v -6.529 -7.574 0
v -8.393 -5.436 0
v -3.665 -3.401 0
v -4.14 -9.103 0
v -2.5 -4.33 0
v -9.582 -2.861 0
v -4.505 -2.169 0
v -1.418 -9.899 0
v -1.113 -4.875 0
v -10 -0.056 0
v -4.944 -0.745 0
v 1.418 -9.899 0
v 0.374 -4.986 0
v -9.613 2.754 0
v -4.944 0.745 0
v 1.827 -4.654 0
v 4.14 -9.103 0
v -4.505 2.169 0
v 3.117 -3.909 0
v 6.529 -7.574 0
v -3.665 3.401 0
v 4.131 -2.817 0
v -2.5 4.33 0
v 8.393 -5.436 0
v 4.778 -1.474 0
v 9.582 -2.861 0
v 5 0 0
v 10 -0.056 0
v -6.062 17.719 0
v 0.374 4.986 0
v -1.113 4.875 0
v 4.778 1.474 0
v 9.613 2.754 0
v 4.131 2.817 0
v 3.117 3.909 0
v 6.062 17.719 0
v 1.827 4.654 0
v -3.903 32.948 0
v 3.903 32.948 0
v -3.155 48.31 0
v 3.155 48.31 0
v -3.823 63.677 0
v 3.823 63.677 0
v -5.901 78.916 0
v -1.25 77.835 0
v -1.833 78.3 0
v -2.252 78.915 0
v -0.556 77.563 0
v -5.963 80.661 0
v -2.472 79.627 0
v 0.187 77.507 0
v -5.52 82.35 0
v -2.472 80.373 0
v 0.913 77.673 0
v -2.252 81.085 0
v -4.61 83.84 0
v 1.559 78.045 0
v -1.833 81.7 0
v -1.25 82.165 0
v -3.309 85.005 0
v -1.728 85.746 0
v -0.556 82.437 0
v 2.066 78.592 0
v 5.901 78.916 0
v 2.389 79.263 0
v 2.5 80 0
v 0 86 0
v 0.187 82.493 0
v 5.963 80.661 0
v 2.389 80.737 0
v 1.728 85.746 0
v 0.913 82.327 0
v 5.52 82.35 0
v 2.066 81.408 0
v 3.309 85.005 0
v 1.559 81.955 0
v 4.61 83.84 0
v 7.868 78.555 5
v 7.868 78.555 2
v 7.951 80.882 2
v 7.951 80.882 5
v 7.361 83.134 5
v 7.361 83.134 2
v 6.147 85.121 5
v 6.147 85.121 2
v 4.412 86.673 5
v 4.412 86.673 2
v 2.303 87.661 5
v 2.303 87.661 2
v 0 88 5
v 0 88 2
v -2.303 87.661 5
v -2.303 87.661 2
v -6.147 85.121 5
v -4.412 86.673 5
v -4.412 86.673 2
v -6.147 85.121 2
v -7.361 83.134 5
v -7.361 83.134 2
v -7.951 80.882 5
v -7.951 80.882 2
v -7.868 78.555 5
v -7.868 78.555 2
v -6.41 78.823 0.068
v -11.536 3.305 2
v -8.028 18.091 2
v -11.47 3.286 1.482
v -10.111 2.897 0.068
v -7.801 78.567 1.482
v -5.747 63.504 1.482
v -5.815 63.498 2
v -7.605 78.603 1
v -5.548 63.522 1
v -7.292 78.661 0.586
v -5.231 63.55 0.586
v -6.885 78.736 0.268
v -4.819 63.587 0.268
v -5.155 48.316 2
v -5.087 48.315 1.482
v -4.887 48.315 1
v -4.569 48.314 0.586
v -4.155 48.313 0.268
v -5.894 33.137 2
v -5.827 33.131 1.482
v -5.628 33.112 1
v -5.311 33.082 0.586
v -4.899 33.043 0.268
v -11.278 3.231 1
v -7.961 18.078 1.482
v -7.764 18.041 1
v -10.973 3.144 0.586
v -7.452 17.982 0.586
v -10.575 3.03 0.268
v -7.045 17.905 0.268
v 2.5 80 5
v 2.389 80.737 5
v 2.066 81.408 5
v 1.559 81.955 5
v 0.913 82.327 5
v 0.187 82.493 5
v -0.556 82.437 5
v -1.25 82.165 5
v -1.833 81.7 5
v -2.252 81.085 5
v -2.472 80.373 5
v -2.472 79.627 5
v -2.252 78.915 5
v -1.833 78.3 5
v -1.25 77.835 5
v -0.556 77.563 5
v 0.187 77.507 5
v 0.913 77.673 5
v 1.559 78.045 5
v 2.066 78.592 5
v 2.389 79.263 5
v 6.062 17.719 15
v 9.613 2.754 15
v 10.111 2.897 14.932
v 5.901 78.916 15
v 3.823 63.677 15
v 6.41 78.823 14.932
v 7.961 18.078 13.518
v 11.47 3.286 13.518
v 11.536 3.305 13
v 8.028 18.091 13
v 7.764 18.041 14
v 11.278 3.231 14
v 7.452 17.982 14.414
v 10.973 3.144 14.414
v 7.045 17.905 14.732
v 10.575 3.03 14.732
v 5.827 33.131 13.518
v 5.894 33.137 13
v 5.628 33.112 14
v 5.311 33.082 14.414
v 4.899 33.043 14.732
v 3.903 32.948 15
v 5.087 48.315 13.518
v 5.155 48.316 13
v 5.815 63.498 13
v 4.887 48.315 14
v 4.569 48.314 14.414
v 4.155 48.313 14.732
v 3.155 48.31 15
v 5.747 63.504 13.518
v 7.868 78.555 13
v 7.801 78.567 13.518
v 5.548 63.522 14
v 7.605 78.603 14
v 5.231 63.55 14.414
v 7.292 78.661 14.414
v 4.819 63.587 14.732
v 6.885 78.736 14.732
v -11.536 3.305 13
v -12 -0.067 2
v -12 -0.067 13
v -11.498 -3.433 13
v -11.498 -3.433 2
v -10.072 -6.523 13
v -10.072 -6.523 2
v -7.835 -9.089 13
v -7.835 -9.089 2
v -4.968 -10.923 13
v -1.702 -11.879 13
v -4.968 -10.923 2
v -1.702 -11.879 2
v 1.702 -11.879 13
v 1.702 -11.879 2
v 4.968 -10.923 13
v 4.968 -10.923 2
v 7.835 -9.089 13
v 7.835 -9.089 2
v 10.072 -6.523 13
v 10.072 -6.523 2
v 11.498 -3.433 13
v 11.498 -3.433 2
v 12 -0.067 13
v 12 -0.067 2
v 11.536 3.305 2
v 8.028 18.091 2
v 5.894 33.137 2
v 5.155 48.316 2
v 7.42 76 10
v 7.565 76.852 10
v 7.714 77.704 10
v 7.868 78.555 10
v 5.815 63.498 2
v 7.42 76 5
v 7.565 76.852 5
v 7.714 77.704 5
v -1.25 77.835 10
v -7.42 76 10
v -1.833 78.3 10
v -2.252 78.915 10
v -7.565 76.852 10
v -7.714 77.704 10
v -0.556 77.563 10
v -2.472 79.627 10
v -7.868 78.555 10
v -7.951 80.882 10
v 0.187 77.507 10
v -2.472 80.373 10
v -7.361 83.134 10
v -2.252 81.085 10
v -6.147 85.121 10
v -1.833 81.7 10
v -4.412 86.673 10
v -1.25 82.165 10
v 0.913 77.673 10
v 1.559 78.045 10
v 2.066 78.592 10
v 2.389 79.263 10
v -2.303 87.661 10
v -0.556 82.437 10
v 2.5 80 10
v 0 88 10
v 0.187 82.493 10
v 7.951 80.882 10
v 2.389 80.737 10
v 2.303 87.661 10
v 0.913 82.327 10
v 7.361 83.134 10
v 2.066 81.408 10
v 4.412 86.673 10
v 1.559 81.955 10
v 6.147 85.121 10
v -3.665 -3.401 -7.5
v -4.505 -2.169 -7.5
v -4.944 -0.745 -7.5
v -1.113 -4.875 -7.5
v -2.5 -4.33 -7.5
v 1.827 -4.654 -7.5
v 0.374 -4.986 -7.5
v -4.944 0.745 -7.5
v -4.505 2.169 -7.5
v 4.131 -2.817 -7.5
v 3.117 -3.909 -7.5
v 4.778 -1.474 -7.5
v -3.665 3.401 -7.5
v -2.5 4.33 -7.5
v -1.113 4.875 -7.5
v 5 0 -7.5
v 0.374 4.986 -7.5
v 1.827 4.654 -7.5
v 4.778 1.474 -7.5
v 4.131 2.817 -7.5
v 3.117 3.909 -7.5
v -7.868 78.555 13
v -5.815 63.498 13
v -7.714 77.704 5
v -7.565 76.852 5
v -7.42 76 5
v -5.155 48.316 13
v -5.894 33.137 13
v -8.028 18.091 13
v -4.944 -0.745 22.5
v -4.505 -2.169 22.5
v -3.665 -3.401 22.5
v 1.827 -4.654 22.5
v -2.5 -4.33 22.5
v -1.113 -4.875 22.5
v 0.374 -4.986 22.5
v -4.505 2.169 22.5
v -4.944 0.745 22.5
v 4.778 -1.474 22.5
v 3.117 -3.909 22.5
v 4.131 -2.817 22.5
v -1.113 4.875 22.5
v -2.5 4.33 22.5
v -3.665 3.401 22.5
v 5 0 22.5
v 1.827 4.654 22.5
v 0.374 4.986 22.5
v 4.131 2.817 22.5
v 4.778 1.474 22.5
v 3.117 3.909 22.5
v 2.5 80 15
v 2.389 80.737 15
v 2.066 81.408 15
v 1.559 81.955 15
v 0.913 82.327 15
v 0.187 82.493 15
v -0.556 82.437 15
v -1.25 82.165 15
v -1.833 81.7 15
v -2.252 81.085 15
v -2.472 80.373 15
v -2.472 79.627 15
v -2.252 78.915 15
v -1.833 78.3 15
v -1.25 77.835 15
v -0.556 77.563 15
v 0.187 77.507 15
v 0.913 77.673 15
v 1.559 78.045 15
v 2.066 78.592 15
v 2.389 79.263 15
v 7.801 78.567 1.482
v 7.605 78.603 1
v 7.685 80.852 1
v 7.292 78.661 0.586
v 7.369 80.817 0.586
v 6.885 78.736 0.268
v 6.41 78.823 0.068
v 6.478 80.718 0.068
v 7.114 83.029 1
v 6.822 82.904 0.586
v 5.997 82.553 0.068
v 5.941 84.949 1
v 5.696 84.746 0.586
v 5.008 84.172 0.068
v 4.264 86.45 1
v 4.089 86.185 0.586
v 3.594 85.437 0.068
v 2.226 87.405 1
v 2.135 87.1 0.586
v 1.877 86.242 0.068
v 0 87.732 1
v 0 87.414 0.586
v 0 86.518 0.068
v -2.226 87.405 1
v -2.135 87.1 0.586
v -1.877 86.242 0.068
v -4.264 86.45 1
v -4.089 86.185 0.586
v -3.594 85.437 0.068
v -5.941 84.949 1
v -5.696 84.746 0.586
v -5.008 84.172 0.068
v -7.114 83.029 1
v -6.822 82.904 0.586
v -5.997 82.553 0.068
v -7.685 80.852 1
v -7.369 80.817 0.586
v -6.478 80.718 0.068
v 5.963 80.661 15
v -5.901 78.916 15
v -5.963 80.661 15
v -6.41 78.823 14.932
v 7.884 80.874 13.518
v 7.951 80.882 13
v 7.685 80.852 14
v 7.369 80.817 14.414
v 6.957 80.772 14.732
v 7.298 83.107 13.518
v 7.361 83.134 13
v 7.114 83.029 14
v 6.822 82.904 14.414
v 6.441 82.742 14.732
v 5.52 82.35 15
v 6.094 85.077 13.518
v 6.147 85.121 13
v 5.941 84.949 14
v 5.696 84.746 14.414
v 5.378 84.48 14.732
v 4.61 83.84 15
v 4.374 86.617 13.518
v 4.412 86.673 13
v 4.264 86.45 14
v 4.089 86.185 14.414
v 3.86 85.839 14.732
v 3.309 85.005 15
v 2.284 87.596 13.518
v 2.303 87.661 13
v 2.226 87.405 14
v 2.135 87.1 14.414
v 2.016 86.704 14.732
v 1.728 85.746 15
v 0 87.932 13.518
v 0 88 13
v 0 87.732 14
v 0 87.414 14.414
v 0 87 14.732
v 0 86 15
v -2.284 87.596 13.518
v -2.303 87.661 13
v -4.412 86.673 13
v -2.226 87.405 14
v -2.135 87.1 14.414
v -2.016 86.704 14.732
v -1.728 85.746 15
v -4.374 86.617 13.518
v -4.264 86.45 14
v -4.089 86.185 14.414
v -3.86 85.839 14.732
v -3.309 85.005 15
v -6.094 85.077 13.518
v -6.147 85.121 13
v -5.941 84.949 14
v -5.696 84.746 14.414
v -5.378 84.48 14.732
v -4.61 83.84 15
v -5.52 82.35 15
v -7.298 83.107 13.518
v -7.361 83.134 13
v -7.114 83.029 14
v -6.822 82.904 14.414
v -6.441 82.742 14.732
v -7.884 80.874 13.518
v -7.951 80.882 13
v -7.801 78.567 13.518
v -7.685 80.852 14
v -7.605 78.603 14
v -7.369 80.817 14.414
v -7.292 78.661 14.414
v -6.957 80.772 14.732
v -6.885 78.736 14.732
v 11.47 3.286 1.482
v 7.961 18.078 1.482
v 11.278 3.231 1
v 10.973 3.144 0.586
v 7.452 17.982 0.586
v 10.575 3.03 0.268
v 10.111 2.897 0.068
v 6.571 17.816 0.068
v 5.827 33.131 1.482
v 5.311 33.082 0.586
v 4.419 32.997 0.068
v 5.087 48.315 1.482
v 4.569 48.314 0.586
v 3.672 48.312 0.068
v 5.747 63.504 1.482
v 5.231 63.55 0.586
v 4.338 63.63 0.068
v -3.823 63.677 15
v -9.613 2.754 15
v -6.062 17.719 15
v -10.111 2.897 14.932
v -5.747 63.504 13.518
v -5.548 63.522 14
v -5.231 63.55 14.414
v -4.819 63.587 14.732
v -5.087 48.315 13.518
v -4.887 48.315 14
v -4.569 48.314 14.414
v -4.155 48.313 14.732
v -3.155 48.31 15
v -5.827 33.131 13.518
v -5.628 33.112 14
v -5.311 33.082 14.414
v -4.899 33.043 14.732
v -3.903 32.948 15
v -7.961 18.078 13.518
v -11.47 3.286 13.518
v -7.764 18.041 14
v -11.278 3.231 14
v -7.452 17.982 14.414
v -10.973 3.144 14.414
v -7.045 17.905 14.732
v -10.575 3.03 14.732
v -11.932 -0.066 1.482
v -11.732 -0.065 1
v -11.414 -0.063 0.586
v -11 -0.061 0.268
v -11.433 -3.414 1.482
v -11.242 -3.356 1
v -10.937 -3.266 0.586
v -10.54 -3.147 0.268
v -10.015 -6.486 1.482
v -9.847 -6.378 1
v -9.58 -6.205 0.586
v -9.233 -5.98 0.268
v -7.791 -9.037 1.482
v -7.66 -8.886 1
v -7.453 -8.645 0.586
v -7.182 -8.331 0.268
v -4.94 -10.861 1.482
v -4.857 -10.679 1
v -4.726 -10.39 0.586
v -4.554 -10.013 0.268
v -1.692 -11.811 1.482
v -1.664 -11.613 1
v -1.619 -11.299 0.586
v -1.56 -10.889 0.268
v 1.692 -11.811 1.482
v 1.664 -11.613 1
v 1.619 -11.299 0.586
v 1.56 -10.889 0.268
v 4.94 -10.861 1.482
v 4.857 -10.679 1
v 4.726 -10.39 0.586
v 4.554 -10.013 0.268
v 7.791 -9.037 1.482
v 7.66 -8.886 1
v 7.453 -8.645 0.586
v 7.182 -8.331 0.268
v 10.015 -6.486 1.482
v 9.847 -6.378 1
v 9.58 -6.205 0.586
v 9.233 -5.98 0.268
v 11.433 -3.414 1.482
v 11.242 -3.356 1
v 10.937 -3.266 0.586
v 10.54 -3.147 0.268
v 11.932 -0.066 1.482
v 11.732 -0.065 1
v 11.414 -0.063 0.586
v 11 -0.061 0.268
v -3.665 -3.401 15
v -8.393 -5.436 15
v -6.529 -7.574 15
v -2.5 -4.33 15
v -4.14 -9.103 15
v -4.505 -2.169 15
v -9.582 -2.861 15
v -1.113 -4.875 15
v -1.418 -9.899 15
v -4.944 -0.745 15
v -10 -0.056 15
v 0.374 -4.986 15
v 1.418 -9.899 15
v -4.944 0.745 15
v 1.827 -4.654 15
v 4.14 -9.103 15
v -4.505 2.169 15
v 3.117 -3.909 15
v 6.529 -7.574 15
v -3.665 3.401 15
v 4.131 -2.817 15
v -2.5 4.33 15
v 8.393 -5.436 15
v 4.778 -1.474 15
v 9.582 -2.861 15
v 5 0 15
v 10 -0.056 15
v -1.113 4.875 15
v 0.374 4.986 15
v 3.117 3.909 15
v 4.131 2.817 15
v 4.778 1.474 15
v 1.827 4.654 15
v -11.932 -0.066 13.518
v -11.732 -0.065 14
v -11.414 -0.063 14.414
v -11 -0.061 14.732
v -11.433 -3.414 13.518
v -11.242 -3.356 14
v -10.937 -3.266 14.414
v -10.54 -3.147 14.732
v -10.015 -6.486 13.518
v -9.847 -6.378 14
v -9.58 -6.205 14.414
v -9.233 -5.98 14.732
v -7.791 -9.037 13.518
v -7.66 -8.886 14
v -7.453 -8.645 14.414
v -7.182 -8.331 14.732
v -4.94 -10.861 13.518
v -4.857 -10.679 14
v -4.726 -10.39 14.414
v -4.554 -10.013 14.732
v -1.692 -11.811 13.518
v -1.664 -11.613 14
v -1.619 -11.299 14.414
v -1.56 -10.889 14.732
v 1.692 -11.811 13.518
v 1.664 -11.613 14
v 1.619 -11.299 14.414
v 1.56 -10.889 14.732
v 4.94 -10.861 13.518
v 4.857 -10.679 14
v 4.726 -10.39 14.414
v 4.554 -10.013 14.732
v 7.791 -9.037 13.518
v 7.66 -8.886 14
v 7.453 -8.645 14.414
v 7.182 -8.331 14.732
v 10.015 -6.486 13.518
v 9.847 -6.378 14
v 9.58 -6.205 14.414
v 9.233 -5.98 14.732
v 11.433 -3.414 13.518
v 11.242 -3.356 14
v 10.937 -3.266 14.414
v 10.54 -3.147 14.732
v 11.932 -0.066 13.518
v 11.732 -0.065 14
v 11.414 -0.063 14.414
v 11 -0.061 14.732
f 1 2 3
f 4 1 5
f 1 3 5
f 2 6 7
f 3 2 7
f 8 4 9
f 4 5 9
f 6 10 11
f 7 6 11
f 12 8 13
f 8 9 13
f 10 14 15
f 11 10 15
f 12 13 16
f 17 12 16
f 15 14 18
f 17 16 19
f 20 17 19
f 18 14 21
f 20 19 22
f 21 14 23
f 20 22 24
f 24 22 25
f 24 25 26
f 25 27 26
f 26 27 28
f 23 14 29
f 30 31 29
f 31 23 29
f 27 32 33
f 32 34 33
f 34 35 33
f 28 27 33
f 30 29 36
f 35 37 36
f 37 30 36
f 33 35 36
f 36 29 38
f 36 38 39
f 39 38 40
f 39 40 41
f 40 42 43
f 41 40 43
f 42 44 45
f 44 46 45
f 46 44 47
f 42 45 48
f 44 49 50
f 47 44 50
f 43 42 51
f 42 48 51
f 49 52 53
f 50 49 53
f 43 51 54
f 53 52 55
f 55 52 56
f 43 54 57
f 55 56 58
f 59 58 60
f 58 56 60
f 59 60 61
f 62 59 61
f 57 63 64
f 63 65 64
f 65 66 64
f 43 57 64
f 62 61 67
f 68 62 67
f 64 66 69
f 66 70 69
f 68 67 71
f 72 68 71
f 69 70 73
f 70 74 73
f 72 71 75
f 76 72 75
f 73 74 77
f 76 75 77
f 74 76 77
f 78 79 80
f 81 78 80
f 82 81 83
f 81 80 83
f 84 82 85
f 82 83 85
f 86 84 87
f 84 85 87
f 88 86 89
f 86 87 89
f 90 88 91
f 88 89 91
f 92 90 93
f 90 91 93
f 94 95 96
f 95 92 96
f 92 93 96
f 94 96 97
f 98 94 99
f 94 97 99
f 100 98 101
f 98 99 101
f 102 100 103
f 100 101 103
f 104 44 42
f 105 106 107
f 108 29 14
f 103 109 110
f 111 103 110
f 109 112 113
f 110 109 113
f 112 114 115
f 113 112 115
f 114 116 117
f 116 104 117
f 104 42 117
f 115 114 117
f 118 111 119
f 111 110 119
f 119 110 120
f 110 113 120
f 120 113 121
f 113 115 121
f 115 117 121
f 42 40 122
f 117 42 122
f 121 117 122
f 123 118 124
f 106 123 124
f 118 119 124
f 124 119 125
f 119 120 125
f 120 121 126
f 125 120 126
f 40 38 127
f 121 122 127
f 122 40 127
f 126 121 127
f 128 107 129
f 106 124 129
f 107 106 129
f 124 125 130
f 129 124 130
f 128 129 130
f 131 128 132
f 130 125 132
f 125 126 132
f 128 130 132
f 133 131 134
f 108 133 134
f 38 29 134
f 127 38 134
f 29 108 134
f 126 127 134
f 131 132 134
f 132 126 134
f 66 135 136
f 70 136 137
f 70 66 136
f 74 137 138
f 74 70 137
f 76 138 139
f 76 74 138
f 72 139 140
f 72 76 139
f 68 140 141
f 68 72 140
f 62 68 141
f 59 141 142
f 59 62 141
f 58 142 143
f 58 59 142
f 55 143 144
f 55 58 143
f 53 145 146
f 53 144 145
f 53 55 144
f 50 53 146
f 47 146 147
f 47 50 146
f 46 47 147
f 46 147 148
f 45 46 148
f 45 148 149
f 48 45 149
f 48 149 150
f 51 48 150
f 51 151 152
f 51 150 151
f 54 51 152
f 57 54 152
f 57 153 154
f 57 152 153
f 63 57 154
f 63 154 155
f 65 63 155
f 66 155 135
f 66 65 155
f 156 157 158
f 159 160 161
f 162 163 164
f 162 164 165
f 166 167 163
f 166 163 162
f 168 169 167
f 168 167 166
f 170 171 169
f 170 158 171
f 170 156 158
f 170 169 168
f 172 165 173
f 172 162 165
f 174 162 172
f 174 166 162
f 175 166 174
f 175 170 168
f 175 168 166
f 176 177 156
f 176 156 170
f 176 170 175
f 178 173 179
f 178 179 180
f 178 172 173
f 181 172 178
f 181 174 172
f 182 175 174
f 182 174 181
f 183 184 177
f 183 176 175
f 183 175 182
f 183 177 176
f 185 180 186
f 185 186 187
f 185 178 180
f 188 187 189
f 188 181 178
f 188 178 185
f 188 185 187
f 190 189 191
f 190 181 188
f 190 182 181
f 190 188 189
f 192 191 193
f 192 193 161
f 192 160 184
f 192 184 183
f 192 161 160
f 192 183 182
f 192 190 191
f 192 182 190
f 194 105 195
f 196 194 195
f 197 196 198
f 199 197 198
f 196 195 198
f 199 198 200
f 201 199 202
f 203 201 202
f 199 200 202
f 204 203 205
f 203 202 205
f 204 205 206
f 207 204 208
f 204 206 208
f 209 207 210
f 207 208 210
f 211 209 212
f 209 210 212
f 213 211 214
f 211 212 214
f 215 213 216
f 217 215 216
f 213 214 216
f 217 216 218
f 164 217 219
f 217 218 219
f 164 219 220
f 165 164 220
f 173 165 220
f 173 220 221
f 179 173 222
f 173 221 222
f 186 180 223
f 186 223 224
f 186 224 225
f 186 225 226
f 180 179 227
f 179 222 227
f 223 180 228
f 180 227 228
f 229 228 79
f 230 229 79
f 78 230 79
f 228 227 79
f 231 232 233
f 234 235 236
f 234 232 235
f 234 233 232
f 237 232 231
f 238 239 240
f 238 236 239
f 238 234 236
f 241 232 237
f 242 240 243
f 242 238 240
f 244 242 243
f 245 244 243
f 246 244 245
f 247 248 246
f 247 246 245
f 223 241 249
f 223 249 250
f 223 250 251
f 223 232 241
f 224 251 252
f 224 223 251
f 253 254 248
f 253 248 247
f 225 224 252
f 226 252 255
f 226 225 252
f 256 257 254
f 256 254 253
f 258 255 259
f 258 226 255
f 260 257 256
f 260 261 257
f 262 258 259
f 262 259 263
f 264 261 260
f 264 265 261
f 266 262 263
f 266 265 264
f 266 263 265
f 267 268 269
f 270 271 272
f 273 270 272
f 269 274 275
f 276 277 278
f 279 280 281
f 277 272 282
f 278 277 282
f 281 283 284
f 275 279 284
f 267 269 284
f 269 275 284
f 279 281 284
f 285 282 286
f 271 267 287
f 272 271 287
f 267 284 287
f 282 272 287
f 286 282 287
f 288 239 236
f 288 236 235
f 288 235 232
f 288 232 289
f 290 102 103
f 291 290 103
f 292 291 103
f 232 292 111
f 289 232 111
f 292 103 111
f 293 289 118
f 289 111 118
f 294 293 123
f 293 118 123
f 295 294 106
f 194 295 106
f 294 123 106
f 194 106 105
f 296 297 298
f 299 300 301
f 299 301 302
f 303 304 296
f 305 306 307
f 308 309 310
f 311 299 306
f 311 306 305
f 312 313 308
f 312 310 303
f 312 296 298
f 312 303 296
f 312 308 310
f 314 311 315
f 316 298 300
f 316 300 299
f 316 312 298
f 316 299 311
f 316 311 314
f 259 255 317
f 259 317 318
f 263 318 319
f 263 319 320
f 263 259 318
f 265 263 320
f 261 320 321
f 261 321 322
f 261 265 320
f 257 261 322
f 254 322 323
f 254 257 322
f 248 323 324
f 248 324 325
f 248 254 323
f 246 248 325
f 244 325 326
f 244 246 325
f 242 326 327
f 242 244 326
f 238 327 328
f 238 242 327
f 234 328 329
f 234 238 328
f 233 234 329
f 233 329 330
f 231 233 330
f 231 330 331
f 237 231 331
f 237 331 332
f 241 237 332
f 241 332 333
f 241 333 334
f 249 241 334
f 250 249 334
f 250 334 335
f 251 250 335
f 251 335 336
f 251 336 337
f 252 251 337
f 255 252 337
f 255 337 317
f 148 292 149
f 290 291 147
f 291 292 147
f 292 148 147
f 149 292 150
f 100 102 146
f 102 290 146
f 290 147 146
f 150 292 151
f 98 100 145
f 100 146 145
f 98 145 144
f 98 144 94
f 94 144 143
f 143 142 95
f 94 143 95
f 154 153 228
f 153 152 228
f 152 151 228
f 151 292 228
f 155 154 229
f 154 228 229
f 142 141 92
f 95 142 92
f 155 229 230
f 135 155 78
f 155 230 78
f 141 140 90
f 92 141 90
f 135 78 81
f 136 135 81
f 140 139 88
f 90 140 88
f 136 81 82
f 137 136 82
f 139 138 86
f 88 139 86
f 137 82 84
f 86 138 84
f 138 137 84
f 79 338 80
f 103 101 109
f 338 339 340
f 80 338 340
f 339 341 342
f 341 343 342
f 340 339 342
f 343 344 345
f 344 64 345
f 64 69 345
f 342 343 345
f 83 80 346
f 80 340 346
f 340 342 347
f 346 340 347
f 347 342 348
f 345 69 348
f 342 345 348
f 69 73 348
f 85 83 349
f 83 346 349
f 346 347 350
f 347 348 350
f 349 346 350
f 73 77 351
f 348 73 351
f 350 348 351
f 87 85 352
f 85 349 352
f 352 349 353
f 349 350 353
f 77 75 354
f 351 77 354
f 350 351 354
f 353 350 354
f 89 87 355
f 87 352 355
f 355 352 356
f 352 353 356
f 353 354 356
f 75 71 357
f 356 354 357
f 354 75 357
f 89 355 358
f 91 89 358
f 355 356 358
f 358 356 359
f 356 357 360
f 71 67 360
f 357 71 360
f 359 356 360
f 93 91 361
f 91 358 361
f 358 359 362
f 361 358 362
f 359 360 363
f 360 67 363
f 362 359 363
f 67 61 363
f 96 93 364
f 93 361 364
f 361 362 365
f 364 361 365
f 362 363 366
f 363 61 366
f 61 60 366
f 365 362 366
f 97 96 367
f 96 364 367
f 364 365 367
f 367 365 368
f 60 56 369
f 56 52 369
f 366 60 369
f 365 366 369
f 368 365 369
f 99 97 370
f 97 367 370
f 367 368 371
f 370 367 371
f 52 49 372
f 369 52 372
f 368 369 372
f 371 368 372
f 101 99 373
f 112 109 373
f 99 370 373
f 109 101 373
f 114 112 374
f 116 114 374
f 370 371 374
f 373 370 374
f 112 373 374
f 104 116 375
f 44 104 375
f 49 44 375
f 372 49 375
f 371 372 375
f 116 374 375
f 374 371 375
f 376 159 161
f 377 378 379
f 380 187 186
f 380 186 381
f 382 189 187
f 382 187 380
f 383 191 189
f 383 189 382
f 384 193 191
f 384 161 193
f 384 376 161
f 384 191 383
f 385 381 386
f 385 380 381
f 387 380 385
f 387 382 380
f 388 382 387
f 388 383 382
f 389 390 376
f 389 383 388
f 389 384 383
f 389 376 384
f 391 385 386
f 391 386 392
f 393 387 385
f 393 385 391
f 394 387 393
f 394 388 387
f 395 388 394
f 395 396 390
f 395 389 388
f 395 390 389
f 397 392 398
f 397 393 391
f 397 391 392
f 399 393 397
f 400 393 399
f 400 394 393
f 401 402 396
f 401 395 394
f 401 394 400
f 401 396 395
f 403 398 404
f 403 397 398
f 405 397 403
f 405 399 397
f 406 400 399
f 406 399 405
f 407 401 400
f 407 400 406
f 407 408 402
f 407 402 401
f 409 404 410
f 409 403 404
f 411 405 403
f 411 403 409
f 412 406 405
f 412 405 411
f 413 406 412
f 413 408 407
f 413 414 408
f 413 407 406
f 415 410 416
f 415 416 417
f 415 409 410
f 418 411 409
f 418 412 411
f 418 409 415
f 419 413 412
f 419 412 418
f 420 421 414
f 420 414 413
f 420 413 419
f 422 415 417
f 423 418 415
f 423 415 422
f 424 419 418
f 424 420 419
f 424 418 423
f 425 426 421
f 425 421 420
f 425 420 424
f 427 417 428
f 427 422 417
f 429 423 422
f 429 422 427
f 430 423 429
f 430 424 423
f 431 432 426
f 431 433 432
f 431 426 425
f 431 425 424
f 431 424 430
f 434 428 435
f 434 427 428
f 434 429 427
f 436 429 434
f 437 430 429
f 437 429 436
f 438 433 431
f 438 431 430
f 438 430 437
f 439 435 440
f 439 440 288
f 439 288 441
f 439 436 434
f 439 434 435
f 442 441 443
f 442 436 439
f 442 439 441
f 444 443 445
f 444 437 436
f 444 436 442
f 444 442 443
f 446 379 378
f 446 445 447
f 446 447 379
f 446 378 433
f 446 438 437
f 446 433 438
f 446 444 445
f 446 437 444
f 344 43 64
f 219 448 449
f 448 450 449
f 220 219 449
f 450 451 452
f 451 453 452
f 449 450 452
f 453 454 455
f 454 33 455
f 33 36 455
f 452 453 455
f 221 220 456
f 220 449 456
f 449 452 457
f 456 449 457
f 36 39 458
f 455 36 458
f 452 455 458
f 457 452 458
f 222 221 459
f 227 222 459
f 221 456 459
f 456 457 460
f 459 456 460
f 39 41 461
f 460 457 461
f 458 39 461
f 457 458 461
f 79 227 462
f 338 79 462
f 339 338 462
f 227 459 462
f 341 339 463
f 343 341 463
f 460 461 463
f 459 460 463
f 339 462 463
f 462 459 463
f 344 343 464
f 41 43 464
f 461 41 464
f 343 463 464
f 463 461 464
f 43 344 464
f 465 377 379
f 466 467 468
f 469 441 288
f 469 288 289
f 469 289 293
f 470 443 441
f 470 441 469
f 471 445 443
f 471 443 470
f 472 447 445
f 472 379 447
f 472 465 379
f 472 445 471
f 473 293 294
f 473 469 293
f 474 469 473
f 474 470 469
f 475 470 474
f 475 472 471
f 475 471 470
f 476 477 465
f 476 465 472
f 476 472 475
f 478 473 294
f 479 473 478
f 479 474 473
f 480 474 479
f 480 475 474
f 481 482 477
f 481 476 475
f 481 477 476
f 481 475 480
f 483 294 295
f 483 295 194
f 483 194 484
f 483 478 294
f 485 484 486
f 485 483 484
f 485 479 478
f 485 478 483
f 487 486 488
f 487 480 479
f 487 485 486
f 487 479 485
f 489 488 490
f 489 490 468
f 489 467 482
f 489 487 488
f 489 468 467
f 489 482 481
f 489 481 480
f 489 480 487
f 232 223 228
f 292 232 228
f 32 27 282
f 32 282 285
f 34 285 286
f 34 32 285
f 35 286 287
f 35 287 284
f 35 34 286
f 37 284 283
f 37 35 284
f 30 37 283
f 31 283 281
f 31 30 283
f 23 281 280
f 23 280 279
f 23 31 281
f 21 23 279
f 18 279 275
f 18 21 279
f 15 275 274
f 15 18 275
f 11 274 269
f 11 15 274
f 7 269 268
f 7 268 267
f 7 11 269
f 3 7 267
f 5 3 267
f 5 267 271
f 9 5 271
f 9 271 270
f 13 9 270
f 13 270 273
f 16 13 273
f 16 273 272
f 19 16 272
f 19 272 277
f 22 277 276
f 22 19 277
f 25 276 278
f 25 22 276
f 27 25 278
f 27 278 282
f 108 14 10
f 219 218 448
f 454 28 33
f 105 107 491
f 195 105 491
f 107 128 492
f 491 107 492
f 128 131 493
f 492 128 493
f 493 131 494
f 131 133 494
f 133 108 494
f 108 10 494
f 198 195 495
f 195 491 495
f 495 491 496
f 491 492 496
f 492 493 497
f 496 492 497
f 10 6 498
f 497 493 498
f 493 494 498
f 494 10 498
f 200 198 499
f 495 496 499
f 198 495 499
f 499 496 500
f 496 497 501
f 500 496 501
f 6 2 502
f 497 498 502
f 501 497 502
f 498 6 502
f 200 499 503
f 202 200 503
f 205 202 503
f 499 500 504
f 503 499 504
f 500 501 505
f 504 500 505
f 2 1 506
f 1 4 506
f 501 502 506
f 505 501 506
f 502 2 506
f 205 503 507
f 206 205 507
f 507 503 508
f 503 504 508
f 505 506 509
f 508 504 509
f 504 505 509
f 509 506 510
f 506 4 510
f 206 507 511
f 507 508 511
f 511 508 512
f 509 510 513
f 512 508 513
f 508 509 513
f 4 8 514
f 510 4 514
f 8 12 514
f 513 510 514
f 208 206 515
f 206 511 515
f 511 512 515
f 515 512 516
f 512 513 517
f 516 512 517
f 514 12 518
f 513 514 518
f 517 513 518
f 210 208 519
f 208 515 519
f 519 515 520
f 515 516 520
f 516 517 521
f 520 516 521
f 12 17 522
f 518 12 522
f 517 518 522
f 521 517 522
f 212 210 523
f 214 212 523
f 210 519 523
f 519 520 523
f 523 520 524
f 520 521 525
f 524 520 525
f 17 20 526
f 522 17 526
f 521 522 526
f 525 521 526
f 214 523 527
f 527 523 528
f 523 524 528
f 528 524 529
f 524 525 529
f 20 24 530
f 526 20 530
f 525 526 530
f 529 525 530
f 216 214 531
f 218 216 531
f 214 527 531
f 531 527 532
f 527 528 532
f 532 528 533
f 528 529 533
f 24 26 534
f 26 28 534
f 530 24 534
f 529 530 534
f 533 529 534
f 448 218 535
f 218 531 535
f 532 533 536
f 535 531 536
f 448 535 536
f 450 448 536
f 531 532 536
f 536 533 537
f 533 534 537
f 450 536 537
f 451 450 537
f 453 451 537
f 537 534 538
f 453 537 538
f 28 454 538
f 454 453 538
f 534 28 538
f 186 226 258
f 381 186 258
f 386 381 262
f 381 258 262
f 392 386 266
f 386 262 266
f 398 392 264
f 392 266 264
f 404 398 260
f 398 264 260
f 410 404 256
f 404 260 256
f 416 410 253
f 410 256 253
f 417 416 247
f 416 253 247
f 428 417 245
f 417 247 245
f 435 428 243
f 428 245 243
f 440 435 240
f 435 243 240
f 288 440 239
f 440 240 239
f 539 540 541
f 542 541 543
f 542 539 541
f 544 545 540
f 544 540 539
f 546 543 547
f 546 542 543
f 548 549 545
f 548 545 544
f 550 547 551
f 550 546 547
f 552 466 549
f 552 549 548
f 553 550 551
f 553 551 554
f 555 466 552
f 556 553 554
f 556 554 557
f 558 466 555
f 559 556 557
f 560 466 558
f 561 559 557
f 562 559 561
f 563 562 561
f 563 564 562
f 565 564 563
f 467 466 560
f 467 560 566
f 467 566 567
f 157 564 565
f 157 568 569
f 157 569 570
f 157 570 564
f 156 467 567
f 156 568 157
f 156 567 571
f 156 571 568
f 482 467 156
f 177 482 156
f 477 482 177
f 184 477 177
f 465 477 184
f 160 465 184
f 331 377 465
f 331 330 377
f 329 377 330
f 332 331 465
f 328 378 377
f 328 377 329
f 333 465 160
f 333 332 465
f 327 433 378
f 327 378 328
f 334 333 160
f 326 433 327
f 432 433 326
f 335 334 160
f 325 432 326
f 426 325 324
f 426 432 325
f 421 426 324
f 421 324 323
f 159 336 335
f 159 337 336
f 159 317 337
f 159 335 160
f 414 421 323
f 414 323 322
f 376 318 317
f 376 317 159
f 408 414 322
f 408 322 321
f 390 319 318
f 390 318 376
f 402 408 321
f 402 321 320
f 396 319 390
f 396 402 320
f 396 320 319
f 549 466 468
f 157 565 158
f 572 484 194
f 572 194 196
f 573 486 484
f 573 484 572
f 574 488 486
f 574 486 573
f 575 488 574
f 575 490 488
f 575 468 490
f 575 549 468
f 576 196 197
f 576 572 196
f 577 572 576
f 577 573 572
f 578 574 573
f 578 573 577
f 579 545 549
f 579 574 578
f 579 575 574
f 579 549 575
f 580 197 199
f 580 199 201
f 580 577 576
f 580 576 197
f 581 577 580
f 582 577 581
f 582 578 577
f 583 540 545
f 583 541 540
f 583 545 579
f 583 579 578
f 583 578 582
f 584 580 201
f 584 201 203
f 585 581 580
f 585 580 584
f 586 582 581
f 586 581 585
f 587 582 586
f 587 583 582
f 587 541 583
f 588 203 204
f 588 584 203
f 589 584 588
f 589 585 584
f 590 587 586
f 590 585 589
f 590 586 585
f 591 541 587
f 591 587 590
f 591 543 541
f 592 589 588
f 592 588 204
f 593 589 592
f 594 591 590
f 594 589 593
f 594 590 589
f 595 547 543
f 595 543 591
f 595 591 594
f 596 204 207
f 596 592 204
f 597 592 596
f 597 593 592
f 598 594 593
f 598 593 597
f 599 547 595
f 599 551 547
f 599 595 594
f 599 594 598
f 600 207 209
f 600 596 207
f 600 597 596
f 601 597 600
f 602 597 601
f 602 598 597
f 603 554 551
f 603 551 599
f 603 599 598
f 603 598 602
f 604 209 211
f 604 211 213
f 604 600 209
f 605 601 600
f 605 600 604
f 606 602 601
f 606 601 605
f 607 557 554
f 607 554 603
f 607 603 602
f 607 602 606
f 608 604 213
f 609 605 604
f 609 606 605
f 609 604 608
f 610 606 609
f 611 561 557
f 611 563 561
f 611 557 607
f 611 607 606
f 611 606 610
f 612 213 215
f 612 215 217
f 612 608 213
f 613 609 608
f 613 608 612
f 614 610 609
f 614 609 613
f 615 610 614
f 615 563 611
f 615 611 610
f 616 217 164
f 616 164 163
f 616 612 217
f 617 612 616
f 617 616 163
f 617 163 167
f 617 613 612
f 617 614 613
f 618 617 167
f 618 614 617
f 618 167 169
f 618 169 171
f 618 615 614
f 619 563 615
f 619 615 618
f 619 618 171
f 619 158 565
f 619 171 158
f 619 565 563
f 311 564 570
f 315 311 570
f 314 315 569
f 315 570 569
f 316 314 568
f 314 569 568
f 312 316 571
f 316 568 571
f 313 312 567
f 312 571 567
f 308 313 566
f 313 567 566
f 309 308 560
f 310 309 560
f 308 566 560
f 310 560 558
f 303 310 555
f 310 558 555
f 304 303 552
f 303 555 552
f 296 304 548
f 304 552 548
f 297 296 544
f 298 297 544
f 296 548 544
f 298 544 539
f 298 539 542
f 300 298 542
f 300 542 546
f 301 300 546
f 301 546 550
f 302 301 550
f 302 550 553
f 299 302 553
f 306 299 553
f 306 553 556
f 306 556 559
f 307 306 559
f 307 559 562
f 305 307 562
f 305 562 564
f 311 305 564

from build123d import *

# Parameters (mm, degrees)
SKETCH1_R                = 2.5
BOSS_EXTRUDE1_DEPTH      = 15
FILLET4_R                = 2
SKETCH9_W                = 5
SKETCH9_H                = 12
CUT_EXTRUDE1_DEPTH       = 13.0000001
CUT_EXTRUDE1_DEPTH_BACK  = 13.0000001
SKETCH10_R               = 5
BOSS_EXTRUDE2_DEPTH      = 22.5
BOSS_EXTRUDE2_DEPTH_BACK = 7.5


with BuildPart() as part:
    # Sketch1 → Boss-Extrude1 (new body)
    with BuildSketch(Plane.XY):
        with BuildLine():
            ThreePointArc((7.868400372, 78.554913295), (0, 88), (-7.868400372, 78.554913295))
            ThreePointArc((-7.868400372, 78.554913295), (-5.349774026, 40.71787649), (-11.535875122, 3.305084746))
            ThreePointArc((-11.535875122, 3.305084746), (0, -12), (11.535875122, 3.305084746))
            ThreePointArc((11.535875122, 3.305084746), (5.349774026, 40.71787649), (7.868400372, 78.554913295))
        make_face()
        with Locations((0, 80)):
            Circle(SKETCH1_R, mode=Mode.SUBTRACT)
    extrude(amount=BOSS_EXTRUDE1_DEPTH)

    # Fillet4
    fillet4_edges = [part.edges().sort_by_distance(p)[0] for p in [
        (5.349774026, 40.71787649, 15),
        (0, 88, 15),
        (-5.349774026, 40.71787649, 15),
        (0, 88, 0),
        (5.349774026, 40.71787649, 0),
        (0, -12, 0),
        (-5.349774026, 40.71787649, 0),
        (0, -12, 15),
    ]]
    fillet(fillet4_edges, radius=FILLET4_R)

    # Sketch9 → Cut-Extrude1 (cut, two sides)
    with BuildSketch(Plane(origin=(0, 0, 0), x_dir=(0, 0, -1), z_dir=(1, 0, 0))) as cut_extrude1_sk:
        with Locations((-7.5, 82.000003295)):
            Rectangle(SKETCH9_W, SKETCH9_H)
    extrude(amount=CUT_EXTRUDE1_DEPTH, mode=Mode.SUBTRACT)
    extrude(cut_extrude1_sk.sketch, amount=-CUT_EXTRUDE1_DEPTH_BACK, mode=Mode.SUBTRACT)

    # Sketch10 → Boss-Extrude2 (add, two sides)
    with BuildSketch(Plane.XY) as boss_extrude2_sk:
        Circle(SKETCH10_R)
    extrude(amount=BOSS_EXTRUDE2_DEPTH)
    extrude(boss_extrude2_sk.sketch, amount=-BOSS_EXTRUDE2_DEPTH_BACK)


solid = part.part
